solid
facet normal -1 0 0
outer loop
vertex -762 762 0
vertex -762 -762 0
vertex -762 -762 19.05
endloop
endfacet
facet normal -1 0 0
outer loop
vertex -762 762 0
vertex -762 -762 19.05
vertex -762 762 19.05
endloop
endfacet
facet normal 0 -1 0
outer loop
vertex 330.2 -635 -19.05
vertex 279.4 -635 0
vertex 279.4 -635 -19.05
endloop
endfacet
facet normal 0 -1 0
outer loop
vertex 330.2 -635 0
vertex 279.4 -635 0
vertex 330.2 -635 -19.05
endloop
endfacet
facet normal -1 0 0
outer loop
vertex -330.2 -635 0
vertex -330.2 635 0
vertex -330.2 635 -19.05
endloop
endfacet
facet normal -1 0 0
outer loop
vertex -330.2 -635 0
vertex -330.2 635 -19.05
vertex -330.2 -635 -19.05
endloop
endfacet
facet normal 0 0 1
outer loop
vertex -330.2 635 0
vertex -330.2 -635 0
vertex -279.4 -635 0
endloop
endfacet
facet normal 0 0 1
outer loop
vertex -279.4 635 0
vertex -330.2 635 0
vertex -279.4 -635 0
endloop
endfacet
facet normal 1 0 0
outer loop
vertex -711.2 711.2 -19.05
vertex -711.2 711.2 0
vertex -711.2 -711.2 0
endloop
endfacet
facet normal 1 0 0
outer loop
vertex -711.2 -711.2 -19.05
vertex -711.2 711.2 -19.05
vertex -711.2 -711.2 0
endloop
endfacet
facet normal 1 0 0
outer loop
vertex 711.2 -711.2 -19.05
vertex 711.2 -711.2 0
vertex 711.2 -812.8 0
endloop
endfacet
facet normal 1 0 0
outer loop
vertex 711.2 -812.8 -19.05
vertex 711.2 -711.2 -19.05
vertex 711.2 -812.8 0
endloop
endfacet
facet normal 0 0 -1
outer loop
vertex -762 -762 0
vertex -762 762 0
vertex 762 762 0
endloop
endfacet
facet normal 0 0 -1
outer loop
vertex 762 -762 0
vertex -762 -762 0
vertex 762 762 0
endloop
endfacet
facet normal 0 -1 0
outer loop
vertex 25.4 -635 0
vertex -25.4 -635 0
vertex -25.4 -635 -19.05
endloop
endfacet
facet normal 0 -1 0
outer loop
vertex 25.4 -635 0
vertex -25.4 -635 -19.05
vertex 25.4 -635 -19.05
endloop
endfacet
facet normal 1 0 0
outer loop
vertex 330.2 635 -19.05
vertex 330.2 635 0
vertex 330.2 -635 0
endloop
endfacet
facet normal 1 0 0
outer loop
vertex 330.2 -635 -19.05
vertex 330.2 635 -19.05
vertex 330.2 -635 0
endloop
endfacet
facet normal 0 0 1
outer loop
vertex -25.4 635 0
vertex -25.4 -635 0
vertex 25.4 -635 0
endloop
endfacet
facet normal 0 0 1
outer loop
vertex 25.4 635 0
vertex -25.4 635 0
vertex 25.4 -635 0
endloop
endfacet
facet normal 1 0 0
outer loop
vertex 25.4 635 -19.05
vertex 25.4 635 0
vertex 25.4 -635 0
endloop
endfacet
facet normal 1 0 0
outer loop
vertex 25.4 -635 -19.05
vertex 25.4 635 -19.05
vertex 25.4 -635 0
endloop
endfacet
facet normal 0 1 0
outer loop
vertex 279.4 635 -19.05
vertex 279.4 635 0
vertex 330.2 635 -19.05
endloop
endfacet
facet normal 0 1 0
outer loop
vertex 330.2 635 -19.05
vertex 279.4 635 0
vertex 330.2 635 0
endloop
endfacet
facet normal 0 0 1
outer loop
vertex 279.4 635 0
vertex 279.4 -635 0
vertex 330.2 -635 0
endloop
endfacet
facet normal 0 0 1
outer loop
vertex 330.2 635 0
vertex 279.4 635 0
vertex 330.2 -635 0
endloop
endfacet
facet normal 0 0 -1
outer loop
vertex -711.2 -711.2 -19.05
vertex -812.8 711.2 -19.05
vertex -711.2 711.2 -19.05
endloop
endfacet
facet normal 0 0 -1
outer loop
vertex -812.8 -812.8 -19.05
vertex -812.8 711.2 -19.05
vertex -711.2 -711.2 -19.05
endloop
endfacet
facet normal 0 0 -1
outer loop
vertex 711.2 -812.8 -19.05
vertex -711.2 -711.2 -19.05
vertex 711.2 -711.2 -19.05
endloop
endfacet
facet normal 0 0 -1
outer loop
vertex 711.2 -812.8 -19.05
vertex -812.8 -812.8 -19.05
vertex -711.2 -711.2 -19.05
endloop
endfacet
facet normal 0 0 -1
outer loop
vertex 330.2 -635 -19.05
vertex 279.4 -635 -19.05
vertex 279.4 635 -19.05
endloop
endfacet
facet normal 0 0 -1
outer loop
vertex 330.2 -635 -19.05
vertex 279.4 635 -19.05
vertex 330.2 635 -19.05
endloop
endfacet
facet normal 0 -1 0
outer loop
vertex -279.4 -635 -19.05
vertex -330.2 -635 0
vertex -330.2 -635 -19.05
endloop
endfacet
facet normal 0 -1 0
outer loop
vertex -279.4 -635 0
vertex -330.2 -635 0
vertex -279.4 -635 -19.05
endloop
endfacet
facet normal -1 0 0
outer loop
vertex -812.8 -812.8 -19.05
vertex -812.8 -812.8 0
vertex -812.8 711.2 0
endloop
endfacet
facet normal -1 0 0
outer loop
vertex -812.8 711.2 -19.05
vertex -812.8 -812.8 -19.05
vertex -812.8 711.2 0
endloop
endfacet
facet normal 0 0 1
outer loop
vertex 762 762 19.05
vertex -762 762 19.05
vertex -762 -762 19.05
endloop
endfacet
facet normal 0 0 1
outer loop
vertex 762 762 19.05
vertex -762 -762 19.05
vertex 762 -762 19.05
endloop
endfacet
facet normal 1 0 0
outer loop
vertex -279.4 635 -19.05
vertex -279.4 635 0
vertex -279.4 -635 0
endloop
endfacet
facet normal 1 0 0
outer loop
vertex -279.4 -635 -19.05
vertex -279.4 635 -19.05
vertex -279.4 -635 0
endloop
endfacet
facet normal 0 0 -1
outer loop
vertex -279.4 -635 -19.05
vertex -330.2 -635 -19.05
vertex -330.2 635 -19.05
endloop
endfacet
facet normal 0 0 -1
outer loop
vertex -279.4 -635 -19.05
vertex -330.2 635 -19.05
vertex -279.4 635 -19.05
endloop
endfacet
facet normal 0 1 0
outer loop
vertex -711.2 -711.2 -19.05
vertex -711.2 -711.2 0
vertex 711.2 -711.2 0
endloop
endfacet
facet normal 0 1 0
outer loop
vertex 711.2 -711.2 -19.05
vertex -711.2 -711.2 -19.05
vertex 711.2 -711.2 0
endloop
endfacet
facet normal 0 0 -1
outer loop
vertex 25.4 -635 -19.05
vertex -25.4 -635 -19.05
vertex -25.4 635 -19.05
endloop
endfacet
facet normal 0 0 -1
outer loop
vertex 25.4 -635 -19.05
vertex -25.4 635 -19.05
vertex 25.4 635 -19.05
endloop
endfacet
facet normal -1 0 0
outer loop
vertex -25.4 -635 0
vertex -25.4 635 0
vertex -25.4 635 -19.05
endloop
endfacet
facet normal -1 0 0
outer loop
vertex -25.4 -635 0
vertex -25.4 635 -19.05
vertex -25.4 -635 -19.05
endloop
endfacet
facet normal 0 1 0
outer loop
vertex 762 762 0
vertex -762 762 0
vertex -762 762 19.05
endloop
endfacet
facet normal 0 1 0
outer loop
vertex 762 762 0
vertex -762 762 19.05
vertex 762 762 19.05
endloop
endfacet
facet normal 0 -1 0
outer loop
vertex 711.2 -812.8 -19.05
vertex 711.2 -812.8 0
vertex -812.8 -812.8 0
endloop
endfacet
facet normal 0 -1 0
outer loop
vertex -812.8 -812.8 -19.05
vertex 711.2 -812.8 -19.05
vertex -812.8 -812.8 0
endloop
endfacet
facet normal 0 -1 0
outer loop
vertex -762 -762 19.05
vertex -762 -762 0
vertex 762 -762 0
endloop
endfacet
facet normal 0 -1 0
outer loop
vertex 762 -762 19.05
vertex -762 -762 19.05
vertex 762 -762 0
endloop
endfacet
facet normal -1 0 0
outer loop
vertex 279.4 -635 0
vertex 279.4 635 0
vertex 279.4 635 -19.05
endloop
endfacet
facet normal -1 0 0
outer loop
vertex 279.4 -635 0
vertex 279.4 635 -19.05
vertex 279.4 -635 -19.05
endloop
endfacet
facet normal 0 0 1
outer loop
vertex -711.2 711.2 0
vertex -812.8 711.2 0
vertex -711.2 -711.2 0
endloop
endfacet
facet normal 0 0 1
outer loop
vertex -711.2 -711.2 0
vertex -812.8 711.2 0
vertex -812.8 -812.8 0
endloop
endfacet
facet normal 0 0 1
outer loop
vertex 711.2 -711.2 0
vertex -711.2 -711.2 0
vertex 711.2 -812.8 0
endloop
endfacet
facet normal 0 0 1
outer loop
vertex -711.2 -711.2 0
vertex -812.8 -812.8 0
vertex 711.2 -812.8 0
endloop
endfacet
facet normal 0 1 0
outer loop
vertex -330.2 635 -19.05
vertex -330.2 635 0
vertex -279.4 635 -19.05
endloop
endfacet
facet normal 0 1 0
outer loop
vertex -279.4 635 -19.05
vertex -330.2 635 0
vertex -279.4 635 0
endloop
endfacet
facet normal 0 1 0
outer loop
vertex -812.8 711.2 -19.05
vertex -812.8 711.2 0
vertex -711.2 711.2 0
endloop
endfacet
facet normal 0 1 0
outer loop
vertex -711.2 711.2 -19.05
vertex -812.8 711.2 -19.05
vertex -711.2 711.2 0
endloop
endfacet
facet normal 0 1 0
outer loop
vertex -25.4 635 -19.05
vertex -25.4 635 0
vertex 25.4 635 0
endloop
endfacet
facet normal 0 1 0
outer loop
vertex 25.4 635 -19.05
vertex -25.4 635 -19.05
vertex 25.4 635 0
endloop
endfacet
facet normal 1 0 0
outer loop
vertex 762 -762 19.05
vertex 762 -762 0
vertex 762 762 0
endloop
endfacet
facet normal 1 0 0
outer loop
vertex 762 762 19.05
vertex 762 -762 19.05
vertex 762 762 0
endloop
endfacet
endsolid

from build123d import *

# Parameters (mm, degrees)
F0_W     = 1524
F0_H     = 1524
F1_DEPTH = 19.05
F3_DEPTH = 19.05
F4_W     = 50.8
F4_H     = 1270
F5_DEPTH = 19.05


with BuildPart() as f1:
    # F0 (on Top) → F1 (new body)
    with BuildSketch(Plane.XY):
        Rectangle(F0_W, F0_H)
    extrude(amount=F1_DEPTH)


with BuildPart() as f3:
    # F2 (on face) → F3 (new body)
    with BuildSketch(Plane(origin=(0, 0, 0), x_dir=(1, 0, 0), z_dir=(0, 0, -1))):
        Polygon((-812.8, 812.8), (-812.8, 762), (-812.8, 711.2), (-812.8, -711.2), (-711.2, -711.2), (-711.2, 711.2), (711.2, 711.2), (711.2, 812.8), align=None)
    extrude(amount=F3_DEPTH)


with BuildPart() as f5:
    # F4 (on face) → F5 (new body)
    with BuildSketch(Plane(origin=(0, 0, 0), x_dir=(1, 0, 0), z_dir=(0, 0, -1))):
        Rectangle(F4_W, F4_H)
        with Locations((-304.8, 0)):
            Rectangle(F4_W, F4_H)
        with Locations((304.8, 0)):
            Rectangle(F4_W, F4_H)
    extrude(amount=F5_DEPTH)


solid = Compound([f1.part, f3.part, f5.part])
